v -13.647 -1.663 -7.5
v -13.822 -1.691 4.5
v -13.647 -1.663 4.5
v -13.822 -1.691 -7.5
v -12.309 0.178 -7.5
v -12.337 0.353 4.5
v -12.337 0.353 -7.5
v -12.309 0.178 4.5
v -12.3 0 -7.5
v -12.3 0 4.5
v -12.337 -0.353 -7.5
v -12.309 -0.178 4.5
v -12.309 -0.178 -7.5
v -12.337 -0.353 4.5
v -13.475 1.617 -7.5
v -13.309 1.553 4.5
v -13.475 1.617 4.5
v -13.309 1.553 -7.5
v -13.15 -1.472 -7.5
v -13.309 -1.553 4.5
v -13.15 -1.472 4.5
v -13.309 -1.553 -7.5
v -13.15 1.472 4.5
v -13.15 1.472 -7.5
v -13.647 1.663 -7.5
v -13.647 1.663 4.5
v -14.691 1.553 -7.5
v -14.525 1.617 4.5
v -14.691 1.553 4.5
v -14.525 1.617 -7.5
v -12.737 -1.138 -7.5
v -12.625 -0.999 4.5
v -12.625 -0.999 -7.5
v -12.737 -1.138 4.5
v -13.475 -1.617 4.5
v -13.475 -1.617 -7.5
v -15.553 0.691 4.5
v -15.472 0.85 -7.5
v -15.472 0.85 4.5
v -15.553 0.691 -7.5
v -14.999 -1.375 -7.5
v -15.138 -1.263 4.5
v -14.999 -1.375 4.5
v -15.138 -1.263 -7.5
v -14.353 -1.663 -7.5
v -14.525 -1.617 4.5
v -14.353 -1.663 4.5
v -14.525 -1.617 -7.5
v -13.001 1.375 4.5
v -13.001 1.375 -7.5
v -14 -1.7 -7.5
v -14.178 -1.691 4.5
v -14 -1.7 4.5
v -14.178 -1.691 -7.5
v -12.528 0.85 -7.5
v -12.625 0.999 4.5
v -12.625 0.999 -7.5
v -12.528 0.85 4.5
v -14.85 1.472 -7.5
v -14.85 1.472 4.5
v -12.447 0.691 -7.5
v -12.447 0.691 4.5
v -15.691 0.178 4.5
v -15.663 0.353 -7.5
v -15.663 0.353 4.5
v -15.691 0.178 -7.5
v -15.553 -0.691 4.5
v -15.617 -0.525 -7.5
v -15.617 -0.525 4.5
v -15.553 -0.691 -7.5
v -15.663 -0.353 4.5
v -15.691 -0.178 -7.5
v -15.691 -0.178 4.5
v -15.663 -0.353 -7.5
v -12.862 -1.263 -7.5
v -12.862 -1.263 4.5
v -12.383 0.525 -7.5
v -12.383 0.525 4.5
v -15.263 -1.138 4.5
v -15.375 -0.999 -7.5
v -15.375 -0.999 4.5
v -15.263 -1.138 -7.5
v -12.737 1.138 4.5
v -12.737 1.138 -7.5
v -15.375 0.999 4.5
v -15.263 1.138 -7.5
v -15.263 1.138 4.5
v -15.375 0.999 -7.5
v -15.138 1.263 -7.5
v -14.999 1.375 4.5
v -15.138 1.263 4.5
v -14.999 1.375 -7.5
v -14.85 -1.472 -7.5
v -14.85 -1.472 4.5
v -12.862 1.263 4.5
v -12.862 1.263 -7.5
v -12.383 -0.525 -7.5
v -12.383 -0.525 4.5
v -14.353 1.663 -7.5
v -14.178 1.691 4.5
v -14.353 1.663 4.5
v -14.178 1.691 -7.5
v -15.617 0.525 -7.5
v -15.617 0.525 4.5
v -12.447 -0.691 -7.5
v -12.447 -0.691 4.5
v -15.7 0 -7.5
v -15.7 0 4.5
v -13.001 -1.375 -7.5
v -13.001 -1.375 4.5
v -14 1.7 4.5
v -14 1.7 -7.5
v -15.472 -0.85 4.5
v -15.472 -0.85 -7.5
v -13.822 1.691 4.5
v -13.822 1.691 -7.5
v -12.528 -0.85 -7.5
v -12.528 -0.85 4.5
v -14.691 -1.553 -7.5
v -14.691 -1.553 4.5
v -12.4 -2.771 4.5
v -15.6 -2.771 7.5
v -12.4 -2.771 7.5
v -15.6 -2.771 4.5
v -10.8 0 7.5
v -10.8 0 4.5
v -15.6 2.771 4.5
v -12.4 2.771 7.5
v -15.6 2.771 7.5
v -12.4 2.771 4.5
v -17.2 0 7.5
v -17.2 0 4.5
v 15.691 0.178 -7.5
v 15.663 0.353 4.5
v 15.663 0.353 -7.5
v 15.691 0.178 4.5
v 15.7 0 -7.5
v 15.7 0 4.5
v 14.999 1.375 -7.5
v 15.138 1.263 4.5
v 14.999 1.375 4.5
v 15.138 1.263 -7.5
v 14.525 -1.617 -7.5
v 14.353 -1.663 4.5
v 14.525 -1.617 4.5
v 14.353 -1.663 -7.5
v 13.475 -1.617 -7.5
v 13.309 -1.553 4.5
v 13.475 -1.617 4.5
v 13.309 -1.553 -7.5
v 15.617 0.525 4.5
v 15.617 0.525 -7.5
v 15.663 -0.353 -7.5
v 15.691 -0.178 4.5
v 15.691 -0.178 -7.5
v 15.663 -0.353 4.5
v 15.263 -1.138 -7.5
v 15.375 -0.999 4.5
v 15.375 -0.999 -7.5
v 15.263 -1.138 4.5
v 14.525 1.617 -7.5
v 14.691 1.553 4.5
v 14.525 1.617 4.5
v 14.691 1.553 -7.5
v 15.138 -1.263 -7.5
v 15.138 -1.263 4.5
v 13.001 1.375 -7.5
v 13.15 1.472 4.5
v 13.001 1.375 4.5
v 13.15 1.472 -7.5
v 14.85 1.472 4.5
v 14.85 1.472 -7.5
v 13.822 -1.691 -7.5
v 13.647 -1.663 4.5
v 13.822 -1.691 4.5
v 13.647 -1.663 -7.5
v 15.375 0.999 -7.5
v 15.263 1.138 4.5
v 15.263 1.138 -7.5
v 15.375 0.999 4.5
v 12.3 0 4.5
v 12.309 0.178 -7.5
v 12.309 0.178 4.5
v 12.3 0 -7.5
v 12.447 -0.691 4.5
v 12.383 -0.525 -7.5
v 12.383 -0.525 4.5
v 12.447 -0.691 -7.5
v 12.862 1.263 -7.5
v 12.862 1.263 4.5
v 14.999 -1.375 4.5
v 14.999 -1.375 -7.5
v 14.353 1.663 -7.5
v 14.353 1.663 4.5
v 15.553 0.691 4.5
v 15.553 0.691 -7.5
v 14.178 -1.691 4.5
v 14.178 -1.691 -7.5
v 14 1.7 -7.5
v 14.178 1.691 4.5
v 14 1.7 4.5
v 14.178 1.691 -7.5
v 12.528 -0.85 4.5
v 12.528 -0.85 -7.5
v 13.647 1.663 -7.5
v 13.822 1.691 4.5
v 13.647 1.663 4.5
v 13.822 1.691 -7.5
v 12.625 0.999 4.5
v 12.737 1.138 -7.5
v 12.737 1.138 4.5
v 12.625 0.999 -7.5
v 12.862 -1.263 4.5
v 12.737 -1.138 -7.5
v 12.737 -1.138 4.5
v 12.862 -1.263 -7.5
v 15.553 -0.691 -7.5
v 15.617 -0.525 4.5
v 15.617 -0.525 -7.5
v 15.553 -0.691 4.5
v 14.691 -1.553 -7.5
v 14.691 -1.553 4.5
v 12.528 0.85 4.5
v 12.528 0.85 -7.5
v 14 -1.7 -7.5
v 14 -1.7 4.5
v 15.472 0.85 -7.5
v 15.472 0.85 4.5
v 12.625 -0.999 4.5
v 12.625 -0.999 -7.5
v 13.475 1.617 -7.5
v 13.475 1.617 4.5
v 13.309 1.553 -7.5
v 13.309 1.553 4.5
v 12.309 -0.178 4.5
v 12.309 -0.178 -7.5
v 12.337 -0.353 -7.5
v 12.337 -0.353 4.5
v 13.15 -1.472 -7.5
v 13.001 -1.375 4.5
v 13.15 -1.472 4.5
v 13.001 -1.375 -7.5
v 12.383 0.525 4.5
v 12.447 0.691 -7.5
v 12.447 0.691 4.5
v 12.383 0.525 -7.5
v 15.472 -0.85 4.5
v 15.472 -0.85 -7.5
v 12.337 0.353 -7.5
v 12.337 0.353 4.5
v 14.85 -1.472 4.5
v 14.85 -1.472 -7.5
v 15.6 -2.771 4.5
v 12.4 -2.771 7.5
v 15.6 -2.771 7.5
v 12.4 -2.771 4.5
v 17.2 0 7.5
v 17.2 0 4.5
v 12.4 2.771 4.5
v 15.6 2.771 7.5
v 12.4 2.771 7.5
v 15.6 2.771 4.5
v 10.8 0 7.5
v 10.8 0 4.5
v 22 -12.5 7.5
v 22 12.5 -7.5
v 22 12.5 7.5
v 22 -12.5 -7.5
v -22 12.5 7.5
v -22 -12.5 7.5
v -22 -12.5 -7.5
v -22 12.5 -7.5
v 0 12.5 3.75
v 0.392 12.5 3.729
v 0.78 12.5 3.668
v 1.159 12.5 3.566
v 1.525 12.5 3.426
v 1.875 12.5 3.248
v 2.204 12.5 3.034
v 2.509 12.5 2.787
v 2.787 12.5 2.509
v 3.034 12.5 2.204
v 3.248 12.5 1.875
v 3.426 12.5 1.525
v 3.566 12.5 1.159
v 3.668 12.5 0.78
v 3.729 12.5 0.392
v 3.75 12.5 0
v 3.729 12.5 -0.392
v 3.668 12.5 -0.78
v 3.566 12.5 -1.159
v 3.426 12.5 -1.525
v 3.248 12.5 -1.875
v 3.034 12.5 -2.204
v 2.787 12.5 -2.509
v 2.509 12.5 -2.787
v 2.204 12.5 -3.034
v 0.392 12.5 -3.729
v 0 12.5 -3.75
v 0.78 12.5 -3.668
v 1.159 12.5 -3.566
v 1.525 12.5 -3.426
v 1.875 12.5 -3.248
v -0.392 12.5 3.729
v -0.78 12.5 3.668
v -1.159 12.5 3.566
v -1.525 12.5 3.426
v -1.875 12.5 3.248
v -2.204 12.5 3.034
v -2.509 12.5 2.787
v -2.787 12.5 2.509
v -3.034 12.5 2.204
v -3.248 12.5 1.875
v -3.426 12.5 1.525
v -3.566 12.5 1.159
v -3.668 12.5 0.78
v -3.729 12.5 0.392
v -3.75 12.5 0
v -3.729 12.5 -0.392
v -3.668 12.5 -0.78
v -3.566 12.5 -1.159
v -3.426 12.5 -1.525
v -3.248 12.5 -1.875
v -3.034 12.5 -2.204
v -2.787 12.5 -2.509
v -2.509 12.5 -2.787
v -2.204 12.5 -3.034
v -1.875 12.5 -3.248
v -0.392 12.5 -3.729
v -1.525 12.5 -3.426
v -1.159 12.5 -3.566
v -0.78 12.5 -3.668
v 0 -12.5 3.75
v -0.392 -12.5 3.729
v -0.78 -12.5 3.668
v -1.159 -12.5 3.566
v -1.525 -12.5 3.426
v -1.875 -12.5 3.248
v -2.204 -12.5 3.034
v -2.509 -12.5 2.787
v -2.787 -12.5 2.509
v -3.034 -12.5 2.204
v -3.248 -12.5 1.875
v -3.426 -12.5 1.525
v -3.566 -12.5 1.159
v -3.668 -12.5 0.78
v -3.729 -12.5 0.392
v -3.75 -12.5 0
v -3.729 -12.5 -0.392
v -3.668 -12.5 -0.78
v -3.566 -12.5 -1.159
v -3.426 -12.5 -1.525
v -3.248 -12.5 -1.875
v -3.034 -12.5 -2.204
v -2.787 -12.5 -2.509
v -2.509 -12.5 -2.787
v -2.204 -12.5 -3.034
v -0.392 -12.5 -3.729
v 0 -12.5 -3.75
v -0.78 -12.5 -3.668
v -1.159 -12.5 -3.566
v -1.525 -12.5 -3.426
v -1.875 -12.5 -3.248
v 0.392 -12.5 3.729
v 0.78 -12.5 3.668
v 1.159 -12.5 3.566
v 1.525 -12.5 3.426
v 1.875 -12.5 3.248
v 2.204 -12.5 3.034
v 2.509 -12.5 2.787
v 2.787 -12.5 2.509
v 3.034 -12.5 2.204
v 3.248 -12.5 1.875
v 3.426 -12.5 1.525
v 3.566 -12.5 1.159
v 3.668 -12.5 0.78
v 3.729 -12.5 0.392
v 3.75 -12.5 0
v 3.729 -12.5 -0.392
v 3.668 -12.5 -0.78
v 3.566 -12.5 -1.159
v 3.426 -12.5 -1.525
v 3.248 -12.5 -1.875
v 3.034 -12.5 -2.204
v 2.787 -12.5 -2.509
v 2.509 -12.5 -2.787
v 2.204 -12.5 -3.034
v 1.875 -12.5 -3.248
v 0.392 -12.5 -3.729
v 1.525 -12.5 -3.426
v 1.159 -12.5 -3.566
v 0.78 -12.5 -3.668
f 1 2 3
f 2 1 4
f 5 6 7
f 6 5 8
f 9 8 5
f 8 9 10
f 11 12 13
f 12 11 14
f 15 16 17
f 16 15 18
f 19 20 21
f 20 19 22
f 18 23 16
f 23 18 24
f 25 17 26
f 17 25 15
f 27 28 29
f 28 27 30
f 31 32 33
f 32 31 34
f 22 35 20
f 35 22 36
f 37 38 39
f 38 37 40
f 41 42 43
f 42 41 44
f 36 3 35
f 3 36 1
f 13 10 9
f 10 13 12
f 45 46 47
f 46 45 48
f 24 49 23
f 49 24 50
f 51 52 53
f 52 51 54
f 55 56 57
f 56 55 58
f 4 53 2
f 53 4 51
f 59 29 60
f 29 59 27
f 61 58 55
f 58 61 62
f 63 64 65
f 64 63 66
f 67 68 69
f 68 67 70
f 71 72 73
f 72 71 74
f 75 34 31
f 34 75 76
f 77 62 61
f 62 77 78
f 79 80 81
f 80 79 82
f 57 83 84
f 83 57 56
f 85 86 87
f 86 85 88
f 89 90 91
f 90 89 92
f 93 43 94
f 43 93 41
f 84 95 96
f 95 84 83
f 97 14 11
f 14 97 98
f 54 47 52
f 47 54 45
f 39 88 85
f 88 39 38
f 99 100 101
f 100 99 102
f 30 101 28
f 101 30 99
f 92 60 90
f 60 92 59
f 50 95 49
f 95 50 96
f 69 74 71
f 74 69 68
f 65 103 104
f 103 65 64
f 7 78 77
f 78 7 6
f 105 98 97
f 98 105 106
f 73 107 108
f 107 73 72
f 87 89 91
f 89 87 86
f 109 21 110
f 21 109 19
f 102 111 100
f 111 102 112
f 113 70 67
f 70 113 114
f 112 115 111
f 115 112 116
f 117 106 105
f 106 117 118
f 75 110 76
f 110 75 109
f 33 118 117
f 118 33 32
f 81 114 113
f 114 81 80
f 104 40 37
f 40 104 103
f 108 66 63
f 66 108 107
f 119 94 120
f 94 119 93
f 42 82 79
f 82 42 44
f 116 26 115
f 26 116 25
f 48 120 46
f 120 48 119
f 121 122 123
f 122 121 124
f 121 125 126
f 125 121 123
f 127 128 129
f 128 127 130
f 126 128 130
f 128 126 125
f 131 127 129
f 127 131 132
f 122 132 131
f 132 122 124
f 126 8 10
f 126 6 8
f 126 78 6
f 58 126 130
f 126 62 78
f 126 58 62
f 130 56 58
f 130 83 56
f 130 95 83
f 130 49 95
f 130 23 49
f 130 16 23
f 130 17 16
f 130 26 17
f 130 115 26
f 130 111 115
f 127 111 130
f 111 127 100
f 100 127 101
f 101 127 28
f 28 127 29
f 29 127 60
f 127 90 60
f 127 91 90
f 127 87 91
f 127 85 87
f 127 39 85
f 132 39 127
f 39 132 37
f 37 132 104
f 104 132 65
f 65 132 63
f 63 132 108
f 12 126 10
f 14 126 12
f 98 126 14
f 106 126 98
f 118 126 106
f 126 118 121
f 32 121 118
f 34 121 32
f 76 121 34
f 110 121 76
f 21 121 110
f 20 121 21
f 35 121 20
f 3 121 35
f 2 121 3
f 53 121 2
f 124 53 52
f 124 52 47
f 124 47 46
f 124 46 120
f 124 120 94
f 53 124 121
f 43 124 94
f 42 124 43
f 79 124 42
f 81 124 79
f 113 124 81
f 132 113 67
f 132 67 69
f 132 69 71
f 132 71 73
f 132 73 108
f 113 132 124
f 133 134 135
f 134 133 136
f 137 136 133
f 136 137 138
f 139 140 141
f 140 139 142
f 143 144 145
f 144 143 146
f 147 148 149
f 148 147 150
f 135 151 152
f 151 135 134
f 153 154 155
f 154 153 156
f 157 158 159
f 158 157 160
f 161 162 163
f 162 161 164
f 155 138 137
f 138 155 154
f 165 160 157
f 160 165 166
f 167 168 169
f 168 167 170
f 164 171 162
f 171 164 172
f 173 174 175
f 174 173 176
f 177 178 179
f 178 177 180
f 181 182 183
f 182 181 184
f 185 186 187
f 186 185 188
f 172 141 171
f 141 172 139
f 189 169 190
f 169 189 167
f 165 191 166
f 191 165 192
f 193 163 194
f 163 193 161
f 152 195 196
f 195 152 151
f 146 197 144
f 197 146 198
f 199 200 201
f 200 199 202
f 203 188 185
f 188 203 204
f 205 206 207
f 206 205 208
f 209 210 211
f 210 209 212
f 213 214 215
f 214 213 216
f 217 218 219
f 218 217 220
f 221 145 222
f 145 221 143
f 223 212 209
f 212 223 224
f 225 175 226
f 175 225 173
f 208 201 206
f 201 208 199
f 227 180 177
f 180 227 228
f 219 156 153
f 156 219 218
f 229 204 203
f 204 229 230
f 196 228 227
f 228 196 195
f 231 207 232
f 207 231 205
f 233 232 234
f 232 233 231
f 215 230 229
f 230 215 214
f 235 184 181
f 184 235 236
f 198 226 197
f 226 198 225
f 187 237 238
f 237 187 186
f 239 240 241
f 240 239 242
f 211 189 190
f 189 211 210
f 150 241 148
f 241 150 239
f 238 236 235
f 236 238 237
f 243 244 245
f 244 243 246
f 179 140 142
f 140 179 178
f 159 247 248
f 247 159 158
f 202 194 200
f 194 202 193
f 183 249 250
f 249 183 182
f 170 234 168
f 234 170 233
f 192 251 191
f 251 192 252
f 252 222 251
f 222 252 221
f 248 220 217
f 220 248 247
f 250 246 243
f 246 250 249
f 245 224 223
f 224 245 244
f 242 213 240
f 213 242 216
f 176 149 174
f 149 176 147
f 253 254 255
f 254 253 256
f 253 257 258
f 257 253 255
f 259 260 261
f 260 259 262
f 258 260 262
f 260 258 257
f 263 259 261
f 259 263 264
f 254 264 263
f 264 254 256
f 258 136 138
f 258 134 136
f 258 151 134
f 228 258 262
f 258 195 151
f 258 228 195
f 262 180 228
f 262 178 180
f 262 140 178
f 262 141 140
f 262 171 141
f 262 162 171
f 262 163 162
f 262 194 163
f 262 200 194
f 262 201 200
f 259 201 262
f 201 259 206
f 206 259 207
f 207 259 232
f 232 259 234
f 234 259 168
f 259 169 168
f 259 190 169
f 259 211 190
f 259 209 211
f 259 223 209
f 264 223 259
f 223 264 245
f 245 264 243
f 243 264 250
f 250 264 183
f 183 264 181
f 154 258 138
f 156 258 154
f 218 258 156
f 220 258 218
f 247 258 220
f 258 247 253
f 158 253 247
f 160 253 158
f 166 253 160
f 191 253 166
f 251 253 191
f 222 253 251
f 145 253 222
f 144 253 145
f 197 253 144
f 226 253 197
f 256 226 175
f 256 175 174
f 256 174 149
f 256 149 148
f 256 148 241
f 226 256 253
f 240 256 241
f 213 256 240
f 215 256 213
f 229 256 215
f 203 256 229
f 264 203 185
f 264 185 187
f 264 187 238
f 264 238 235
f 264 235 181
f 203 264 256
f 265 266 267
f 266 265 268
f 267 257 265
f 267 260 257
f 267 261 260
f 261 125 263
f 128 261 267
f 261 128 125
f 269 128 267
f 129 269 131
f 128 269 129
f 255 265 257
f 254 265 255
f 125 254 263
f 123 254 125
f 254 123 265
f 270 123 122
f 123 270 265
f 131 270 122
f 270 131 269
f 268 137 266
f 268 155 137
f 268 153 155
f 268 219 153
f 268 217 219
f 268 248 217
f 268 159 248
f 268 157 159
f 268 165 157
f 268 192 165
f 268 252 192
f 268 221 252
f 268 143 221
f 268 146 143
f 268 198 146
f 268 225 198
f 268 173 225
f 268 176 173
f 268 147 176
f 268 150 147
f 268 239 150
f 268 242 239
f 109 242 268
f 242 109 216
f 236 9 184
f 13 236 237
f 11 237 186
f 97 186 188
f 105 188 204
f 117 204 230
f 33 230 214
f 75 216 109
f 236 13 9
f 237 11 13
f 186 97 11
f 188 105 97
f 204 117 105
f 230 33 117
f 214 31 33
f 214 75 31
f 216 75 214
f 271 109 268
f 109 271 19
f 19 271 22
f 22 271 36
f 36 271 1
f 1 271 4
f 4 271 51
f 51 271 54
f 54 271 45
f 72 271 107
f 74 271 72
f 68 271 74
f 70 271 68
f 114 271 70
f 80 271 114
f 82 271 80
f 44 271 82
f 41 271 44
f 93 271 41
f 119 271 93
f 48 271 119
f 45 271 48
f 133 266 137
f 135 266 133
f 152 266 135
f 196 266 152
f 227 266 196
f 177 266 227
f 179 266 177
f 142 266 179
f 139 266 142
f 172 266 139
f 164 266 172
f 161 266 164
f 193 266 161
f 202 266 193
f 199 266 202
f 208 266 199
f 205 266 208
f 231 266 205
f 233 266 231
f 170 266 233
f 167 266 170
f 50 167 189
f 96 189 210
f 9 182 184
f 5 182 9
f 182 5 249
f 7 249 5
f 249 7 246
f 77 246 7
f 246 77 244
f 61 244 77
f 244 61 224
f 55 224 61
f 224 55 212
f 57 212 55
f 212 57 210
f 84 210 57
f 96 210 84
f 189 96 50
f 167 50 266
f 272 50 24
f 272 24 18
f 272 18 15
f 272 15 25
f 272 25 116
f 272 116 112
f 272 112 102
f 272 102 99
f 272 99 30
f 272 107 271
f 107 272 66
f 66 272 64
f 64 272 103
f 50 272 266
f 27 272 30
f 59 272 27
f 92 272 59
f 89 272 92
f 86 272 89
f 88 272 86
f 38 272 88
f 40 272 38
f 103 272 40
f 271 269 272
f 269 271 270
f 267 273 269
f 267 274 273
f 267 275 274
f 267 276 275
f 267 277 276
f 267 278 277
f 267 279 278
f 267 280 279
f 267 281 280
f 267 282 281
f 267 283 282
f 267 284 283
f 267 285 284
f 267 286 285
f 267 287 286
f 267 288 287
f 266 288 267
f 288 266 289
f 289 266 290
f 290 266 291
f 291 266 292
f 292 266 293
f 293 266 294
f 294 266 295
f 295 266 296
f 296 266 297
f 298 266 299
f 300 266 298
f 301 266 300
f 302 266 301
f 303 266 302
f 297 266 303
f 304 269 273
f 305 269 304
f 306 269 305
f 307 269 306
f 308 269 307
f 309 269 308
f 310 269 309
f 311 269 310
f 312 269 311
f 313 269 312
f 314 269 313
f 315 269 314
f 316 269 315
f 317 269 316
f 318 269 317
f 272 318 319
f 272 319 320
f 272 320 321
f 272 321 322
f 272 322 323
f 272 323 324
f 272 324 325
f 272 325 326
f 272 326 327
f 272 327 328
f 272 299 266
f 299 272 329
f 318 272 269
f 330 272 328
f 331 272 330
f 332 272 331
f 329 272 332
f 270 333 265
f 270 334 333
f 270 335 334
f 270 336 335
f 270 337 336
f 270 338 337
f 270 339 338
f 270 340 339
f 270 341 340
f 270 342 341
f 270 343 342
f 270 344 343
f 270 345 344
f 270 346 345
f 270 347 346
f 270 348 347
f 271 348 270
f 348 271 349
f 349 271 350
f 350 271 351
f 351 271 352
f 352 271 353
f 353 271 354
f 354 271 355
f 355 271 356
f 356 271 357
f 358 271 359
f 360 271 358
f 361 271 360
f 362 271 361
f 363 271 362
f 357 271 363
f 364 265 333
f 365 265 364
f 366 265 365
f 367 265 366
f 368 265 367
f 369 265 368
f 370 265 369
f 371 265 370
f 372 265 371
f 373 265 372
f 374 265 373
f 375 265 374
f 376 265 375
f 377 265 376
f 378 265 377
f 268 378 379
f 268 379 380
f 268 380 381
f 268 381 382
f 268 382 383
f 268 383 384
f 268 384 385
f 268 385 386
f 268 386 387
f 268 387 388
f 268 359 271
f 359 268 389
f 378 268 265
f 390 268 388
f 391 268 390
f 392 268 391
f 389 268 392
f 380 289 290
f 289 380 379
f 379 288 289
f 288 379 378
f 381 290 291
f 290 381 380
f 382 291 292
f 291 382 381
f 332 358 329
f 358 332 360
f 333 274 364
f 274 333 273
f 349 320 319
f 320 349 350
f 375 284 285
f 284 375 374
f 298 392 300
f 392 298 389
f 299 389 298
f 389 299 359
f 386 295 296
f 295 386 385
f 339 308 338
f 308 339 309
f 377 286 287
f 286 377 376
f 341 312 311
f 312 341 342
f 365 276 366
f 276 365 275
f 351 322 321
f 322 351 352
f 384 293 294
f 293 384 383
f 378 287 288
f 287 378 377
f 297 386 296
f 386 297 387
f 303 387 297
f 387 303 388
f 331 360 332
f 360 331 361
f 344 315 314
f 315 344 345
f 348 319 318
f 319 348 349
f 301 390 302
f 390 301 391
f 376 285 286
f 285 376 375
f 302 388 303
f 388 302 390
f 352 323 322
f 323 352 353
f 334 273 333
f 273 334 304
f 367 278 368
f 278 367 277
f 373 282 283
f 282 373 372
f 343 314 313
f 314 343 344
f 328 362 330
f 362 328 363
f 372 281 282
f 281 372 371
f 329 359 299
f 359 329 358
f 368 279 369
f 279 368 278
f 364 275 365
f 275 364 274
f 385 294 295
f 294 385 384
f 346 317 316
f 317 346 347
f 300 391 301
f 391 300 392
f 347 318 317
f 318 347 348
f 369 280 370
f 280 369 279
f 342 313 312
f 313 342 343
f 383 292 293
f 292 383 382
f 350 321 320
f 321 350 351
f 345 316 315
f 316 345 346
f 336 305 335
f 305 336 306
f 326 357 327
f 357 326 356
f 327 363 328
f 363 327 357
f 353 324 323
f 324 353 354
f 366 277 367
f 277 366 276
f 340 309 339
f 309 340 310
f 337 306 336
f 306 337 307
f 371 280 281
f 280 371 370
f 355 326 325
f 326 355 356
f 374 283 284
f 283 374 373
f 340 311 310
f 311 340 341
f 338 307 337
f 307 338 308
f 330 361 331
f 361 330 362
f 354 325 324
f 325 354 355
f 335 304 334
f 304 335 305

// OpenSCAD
// Cable strain-relief clamp for 7 mm bundle.
$fn = 60;
eps = 0.02;
body_l = 44;
body_w = 25;
body_h = 15;
cable_d = 7.5;
bolt_pitch = 28;
difference() {
    cube([body_l, body_w, body_h], center = true);
    translate([0, -body_w / 2 - eps, 0]) rotate([-90, 0, 0]) cylinder(d = cable_d, h = body_w + 2 * eps);
    for (x = [-bolt_pitch / 2, bolt_pitch / 2]) {
        translate([x, 0, -body_h / 2 - eps]) cylinder(d = 3.4, h = body_h + 2 * eps);
        translate([x, 0, body_h / 2 - 3]) cylinder(d = 6.4, h = 3 + eps, $fn = 6);
    }
}
